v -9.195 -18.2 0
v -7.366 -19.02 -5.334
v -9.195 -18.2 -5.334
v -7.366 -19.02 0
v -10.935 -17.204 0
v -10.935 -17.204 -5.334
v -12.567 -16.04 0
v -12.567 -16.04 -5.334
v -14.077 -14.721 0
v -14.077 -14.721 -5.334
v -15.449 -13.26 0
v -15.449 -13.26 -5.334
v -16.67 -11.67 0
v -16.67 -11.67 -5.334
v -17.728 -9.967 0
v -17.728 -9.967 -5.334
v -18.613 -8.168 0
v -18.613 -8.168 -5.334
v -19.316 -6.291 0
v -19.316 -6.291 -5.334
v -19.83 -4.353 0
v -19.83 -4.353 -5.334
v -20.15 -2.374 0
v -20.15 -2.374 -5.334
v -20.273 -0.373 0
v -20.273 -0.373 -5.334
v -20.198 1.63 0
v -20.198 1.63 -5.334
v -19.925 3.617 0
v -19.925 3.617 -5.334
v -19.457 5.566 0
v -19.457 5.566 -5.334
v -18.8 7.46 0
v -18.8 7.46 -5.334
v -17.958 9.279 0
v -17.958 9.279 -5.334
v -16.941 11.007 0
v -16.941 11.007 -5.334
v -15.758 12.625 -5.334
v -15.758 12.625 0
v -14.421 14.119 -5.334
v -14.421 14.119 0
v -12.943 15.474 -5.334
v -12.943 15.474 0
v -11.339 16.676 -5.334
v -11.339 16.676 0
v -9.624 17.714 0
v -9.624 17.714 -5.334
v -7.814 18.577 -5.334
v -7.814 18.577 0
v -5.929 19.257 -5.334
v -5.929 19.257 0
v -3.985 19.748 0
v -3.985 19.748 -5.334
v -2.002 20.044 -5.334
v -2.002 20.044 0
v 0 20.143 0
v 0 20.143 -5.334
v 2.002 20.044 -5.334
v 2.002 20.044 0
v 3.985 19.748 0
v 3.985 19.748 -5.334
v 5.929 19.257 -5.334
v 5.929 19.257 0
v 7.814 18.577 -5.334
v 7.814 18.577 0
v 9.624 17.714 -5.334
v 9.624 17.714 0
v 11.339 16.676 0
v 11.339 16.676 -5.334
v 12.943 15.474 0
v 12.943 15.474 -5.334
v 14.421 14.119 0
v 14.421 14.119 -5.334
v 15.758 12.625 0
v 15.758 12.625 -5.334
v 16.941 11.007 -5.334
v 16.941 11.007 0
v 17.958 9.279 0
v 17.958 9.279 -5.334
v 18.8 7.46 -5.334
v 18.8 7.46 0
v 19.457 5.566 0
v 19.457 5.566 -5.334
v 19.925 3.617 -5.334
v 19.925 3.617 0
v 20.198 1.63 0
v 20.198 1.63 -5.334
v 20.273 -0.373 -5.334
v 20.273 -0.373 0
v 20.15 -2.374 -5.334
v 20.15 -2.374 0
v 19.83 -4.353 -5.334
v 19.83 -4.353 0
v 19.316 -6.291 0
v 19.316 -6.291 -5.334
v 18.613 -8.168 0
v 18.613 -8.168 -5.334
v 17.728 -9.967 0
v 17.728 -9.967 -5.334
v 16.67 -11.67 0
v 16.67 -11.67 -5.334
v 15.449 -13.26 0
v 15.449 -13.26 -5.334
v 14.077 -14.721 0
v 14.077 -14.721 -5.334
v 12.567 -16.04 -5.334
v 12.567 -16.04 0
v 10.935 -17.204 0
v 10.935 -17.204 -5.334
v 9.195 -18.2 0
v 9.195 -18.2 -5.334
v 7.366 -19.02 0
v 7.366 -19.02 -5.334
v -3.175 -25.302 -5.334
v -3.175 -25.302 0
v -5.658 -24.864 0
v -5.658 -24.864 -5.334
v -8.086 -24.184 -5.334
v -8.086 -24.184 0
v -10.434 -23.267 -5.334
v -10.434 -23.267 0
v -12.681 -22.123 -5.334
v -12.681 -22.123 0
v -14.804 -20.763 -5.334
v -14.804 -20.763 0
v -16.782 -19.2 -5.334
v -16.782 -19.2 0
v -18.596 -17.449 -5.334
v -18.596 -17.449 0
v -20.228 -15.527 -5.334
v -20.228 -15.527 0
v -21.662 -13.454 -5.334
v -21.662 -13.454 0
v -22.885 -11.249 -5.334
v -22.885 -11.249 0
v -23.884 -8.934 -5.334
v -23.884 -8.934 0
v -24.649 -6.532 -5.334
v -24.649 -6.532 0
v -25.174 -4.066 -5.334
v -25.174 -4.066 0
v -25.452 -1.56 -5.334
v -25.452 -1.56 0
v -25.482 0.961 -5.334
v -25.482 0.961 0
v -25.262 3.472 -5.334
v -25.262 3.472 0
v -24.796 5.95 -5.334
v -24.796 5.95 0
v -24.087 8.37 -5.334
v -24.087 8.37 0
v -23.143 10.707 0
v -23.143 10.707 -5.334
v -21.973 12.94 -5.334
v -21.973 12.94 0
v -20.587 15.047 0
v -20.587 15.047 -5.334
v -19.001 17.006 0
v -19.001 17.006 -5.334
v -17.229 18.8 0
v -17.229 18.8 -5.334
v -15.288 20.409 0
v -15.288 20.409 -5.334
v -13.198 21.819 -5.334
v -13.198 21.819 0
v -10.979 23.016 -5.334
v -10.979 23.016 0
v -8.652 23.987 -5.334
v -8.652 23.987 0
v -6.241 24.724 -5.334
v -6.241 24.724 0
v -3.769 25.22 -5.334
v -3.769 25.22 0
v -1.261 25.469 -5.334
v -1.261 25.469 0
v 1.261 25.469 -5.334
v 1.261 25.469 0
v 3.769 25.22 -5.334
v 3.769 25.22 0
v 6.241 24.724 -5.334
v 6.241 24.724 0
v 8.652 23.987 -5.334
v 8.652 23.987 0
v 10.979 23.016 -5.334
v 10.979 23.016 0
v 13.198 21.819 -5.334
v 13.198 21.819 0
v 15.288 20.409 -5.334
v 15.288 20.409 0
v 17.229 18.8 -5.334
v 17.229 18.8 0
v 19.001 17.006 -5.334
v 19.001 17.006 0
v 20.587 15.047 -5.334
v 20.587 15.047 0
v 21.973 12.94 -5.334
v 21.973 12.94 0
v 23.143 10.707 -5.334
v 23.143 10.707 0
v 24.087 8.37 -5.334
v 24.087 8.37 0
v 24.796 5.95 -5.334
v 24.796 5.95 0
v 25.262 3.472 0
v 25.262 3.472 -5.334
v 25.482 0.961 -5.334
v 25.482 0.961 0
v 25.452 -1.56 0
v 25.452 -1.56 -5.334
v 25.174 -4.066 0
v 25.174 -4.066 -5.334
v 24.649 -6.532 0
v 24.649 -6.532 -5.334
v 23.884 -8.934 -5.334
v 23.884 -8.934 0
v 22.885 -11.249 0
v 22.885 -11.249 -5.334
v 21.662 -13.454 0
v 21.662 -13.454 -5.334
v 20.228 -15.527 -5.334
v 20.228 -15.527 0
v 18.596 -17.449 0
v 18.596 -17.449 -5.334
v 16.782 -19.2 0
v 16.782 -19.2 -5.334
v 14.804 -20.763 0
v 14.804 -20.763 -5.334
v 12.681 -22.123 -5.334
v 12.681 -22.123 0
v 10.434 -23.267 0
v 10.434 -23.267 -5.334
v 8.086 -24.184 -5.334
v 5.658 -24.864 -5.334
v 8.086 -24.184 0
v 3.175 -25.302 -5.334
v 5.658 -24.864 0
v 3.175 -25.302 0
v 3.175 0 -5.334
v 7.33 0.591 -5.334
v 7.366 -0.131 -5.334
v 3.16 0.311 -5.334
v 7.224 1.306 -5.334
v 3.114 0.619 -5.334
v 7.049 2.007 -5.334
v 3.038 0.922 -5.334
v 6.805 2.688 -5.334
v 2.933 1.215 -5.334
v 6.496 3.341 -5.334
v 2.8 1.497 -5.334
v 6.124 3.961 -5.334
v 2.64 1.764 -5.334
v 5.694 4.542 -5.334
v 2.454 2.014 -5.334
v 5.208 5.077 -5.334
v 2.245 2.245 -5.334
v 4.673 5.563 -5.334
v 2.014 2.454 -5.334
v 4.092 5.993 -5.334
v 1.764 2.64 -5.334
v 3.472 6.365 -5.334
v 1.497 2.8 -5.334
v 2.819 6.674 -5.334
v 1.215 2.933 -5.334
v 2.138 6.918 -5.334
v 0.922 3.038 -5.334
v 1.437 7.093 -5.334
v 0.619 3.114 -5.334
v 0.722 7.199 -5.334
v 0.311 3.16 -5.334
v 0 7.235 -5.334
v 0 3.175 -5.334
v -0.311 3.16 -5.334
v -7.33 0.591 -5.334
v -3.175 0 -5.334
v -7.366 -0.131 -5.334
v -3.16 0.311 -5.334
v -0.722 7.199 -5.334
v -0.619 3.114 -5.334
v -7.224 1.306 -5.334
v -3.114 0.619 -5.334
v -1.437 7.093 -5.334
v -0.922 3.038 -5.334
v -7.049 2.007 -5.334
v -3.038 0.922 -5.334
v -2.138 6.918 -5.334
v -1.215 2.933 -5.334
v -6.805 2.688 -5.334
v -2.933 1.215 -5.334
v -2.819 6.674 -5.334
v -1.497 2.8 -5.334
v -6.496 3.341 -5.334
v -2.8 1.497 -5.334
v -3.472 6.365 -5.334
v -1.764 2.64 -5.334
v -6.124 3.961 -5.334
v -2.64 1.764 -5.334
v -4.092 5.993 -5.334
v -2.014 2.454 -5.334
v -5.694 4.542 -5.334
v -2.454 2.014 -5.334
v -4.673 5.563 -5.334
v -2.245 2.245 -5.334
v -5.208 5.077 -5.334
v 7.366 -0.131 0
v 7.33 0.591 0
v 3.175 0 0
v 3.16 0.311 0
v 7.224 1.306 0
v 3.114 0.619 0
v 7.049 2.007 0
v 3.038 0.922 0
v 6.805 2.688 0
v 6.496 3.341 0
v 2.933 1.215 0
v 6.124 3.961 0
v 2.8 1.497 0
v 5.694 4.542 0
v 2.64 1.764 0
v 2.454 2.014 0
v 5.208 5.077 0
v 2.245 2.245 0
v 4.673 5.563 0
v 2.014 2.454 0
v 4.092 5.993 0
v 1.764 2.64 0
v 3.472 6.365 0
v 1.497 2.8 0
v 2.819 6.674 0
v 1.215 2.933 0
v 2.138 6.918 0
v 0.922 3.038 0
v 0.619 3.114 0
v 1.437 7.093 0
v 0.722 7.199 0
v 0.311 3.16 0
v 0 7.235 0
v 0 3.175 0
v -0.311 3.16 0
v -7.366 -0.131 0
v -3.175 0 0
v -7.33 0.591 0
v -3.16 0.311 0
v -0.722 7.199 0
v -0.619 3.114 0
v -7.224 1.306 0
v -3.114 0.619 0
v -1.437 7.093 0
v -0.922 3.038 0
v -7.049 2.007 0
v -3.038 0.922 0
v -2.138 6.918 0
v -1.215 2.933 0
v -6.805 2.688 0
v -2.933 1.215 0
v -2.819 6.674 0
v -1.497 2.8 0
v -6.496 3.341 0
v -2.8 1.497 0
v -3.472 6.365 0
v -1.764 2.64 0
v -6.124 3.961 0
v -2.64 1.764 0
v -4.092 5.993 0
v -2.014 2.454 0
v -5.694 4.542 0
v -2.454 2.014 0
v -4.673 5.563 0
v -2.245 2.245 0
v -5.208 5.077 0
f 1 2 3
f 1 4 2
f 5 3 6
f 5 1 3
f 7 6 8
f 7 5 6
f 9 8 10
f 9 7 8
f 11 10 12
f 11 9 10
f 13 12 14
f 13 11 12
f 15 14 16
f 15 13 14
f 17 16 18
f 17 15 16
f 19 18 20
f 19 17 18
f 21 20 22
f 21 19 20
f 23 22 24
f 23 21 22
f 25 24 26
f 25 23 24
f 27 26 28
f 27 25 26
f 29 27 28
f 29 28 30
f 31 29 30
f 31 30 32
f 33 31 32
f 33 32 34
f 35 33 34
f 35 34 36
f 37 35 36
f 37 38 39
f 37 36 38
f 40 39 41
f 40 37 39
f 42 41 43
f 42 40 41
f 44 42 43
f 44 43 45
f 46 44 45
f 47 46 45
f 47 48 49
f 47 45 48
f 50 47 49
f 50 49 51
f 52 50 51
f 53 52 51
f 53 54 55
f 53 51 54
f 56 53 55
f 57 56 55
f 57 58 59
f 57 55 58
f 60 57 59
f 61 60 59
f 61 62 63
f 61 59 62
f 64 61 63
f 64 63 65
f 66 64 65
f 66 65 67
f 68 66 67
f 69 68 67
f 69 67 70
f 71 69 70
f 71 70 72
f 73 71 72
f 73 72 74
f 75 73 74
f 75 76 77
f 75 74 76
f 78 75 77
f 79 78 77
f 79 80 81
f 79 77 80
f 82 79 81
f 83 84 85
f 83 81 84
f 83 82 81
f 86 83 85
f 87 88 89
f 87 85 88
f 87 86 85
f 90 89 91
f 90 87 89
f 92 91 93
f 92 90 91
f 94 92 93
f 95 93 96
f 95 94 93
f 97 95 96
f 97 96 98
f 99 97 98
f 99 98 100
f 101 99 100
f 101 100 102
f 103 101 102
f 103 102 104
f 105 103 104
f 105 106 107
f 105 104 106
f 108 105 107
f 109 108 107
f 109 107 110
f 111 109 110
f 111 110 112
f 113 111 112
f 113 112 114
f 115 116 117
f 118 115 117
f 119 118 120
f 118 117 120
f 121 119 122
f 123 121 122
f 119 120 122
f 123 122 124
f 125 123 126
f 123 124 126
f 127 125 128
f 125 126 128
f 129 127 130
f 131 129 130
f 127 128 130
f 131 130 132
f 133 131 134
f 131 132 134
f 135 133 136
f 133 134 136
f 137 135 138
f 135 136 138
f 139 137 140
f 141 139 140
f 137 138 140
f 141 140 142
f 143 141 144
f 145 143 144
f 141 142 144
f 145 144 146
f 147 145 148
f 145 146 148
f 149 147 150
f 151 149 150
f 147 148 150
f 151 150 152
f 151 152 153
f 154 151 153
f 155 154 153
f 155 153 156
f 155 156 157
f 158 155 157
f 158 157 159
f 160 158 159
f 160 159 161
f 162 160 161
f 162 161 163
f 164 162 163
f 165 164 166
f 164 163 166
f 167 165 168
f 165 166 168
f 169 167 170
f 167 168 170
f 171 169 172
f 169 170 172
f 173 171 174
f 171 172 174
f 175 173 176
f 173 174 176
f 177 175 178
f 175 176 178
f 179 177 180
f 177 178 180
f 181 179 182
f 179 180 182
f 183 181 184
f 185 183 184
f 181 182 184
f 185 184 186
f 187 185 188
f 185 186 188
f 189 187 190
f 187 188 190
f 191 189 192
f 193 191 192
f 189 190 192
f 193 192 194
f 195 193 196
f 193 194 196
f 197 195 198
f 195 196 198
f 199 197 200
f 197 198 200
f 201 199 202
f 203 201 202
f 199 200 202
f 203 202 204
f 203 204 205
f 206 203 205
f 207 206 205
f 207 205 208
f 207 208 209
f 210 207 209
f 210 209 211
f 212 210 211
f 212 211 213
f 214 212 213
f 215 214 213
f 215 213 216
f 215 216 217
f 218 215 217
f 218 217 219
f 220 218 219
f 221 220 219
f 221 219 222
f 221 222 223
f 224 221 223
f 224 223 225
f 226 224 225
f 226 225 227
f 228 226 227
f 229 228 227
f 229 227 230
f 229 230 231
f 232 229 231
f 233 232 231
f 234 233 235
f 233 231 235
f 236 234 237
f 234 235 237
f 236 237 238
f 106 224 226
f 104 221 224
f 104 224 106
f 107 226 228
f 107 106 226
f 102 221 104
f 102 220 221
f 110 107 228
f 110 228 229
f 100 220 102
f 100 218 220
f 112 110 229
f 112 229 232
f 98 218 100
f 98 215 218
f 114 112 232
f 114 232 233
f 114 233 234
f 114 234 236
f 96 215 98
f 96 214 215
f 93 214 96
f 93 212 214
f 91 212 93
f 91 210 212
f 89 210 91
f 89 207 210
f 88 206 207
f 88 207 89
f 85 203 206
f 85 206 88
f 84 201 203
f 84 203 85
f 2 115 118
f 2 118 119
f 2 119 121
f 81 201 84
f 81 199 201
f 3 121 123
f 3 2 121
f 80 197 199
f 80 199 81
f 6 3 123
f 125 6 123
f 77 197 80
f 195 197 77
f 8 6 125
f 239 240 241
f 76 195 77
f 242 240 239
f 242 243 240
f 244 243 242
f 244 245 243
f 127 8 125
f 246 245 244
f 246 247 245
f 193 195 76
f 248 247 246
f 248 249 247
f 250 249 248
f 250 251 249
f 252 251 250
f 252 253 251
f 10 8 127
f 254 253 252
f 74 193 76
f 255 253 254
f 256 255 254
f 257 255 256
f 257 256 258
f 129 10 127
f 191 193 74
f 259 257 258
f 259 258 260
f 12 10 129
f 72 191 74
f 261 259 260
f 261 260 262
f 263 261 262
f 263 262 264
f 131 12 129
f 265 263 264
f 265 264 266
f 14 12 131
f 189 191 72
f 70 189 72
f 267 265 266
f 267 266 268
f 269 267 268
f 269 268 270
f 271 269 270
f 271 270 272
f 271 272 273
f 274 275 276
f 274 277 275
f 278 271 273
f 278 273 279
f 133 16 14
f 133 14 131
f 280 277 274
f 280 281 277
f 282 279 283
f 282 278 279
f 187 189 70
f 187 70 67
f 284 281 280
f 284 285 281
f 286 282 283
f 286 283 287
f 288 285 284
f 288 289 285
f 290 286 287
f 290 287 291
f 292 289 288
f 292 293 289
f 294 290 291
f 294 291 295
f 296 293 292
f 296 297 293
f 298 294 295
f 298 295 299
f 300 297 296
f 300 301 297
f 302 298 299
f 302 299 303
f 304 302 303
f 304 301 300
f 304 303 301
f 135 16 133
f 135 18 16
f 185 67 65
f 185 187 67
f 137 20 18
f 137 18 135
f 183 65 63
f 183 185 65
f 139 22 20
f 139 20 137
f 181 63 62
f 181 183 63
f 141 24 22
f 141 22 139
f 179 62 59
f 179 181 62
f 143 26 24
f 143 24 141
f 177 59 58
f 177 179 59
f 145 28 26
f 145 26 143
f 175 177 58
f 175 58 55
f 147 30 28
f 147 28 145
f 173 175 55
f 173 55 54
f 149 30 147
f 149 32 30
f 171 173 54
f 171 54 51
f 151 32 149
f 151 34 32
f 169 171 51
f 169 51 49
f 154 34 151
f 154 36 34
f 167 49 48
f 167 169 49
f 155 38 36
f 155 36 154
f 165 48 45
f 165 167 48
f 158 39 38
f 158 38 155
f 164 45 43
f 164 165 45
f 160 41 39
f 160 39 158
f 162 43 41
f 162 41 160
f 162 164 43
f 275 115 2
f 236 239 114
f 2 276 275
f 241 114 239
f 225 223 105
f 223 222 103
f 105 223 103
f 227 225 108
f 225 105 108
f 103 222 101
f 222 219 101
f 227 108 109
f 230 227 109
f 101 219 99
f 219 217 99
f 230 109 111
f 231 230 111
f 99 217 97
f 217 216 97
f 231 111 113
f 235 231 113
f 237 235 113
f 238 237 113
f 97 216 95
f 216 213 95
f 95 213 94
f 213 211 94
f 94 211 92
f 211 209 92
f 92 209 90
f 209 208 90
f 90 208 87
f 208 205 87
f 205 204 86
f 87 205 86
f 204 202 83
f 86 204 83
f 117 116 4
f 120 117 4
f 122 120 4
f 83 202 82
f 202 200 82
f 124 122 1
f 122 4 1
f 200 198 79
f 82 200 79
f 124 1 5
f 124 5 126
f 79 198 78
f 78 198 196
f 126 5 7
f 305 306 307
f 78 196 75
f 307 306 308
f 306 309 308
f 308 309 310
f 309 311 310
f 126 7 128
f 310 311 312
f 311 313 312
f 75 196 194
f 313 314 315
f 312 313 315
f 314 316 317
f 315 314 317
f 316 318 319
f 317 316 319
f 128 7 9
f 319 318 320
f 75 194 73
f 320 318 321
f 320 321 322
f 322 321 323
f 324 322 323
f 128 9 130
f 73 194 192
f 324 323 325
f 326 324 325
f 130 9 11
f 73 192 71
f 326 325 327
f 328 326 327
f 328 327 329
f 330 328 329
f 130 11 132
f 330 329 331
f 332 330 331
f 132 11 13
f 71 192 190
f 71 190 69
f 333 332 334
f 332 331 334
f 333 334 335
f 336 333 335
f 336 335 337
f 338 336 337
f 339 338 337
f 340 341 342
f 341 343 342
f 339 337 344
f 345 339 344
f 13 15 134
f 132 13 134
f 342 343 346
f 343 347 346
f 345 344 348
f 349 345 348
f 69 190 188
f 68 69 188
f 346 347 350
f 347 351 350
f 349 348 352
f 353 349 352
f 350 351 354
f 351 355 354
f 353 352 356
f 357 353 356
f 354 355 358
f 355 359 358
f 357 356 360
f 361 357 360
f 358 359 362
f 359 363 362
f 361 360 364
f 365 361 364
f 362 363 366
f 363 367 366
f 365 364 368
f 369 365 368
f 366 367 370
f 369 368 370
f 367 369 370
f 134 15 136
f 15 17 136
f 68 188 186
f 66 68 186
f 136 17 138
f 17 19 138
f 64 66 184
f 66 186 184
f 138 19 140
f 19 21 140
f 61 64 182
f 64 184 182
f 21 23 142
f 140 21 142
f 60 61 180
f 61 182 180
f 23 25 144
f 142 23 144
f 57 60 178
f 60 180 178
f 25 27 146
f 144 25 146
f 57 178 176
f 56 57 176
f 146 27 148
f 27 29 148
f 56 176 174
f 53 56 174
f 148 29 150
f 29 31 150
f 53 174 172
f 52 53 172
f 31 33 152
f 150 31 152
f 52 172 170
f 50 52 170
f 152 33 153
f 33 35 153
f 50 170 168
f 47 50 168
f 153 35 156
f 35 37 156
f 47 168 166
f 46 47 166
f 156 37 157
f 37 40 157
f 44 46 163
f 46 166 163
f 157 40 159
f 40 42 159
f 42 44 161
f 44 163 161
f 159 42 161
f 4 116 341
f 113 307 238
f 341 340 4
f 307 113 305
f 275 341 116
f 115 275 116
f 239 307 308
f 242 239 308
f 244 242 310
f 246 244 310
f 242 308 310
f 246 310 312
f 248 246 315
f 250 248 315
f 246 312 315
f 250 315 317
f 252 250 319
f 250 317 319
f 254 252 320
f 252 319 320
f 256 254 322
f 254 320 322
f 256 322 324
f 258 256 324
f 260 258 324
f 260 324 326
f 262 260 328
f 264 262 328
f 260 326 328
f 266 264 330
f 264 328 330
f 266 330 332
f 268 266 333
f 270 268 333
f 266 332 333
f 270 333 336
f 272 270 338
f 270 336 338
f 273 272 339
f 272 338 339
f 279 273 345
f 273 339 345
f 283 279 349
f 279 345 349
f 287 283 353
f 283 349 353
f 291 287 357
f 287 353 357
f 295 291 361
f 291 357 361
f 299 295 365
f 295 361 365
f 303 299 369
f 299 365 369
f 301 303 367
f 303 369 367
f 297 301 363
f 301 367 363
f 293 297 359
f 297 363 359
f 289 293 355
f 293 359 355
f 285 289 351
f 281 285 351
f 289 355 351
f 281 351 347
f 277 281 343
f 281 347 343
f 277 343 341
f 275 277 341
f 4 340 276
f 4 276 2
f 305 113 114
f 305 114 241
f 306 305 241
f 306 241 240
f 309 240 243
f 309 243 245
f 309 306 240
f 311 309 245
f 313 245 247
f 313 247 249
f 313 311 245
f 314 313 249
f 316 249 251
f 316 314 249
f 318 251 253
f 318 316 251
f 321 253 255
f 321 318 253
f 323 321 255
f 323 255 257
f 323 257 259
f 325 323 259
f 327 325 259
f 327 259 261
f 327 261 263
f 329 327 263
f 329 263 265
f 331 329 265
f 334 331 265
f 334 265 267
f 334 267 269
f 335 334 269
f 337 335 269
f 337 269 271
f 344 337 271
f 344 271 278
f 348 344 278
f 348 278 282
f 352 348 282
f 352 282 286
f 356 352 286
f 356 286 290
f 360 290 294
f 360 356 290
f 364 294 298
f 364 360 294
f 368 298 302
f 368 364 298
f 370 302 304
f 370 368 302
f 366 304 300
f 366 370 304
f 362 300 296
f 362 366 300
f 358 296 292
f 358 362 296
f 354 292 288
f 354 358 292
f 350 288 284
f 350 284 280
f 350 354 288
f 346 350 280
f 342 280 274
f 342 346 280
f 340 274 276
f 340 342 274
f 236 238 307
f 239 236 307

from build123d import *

# Parameters (mm, degrees)
BOSS_EXTRUDE1_DEPTH = 5.334
CUT_EXTRUDE1_DEPTH  = 37.454787834


with BuildPart() as part:
    # Sketch1 → Boss-Extrude1 (new body)
    with BuildSketch(Plane.XY):
        with BuildLine():
            Line((-3.175, 0), (-3.175, -25.301568627))
            ThreePointArc((-3.175, -25.301568627), (0, 25.5), (3.175, -25.301568627))
            Line((3.175, -25.301568627), (3.175, 0))
            ThreePointArc((3.175, 0), (0, 3.175), (-3.175, 0))
        make_face()
    extrude(amount=-BOSS_EXTRUDE1_DEPTH)

    # Sketch3 → Cut-Extrude1 (cut, through all)
    with BuildSketch(Plane.XY):
        with BuildLine():
            Line((-7.365810735, -0.130956725), (-7.365810735, -19.019753779))
            ThreePointArc((-7.365810735, -19.019753779), (0, 20.143209644), (7.365810735, -19.019753779))
            Line((7.365810735, -19.019753779), (7.365810735, -0.130956725))
            ThreePointArc((7.365810735, -0.130956725), (0, 7.23485401), (-7.365810735, -0.130956725))
        make_face()
    extrude(amount=-CUT_EXTRUDE1_DEPTH, mode=Mode.SUBTRACT)


solid = part.part
